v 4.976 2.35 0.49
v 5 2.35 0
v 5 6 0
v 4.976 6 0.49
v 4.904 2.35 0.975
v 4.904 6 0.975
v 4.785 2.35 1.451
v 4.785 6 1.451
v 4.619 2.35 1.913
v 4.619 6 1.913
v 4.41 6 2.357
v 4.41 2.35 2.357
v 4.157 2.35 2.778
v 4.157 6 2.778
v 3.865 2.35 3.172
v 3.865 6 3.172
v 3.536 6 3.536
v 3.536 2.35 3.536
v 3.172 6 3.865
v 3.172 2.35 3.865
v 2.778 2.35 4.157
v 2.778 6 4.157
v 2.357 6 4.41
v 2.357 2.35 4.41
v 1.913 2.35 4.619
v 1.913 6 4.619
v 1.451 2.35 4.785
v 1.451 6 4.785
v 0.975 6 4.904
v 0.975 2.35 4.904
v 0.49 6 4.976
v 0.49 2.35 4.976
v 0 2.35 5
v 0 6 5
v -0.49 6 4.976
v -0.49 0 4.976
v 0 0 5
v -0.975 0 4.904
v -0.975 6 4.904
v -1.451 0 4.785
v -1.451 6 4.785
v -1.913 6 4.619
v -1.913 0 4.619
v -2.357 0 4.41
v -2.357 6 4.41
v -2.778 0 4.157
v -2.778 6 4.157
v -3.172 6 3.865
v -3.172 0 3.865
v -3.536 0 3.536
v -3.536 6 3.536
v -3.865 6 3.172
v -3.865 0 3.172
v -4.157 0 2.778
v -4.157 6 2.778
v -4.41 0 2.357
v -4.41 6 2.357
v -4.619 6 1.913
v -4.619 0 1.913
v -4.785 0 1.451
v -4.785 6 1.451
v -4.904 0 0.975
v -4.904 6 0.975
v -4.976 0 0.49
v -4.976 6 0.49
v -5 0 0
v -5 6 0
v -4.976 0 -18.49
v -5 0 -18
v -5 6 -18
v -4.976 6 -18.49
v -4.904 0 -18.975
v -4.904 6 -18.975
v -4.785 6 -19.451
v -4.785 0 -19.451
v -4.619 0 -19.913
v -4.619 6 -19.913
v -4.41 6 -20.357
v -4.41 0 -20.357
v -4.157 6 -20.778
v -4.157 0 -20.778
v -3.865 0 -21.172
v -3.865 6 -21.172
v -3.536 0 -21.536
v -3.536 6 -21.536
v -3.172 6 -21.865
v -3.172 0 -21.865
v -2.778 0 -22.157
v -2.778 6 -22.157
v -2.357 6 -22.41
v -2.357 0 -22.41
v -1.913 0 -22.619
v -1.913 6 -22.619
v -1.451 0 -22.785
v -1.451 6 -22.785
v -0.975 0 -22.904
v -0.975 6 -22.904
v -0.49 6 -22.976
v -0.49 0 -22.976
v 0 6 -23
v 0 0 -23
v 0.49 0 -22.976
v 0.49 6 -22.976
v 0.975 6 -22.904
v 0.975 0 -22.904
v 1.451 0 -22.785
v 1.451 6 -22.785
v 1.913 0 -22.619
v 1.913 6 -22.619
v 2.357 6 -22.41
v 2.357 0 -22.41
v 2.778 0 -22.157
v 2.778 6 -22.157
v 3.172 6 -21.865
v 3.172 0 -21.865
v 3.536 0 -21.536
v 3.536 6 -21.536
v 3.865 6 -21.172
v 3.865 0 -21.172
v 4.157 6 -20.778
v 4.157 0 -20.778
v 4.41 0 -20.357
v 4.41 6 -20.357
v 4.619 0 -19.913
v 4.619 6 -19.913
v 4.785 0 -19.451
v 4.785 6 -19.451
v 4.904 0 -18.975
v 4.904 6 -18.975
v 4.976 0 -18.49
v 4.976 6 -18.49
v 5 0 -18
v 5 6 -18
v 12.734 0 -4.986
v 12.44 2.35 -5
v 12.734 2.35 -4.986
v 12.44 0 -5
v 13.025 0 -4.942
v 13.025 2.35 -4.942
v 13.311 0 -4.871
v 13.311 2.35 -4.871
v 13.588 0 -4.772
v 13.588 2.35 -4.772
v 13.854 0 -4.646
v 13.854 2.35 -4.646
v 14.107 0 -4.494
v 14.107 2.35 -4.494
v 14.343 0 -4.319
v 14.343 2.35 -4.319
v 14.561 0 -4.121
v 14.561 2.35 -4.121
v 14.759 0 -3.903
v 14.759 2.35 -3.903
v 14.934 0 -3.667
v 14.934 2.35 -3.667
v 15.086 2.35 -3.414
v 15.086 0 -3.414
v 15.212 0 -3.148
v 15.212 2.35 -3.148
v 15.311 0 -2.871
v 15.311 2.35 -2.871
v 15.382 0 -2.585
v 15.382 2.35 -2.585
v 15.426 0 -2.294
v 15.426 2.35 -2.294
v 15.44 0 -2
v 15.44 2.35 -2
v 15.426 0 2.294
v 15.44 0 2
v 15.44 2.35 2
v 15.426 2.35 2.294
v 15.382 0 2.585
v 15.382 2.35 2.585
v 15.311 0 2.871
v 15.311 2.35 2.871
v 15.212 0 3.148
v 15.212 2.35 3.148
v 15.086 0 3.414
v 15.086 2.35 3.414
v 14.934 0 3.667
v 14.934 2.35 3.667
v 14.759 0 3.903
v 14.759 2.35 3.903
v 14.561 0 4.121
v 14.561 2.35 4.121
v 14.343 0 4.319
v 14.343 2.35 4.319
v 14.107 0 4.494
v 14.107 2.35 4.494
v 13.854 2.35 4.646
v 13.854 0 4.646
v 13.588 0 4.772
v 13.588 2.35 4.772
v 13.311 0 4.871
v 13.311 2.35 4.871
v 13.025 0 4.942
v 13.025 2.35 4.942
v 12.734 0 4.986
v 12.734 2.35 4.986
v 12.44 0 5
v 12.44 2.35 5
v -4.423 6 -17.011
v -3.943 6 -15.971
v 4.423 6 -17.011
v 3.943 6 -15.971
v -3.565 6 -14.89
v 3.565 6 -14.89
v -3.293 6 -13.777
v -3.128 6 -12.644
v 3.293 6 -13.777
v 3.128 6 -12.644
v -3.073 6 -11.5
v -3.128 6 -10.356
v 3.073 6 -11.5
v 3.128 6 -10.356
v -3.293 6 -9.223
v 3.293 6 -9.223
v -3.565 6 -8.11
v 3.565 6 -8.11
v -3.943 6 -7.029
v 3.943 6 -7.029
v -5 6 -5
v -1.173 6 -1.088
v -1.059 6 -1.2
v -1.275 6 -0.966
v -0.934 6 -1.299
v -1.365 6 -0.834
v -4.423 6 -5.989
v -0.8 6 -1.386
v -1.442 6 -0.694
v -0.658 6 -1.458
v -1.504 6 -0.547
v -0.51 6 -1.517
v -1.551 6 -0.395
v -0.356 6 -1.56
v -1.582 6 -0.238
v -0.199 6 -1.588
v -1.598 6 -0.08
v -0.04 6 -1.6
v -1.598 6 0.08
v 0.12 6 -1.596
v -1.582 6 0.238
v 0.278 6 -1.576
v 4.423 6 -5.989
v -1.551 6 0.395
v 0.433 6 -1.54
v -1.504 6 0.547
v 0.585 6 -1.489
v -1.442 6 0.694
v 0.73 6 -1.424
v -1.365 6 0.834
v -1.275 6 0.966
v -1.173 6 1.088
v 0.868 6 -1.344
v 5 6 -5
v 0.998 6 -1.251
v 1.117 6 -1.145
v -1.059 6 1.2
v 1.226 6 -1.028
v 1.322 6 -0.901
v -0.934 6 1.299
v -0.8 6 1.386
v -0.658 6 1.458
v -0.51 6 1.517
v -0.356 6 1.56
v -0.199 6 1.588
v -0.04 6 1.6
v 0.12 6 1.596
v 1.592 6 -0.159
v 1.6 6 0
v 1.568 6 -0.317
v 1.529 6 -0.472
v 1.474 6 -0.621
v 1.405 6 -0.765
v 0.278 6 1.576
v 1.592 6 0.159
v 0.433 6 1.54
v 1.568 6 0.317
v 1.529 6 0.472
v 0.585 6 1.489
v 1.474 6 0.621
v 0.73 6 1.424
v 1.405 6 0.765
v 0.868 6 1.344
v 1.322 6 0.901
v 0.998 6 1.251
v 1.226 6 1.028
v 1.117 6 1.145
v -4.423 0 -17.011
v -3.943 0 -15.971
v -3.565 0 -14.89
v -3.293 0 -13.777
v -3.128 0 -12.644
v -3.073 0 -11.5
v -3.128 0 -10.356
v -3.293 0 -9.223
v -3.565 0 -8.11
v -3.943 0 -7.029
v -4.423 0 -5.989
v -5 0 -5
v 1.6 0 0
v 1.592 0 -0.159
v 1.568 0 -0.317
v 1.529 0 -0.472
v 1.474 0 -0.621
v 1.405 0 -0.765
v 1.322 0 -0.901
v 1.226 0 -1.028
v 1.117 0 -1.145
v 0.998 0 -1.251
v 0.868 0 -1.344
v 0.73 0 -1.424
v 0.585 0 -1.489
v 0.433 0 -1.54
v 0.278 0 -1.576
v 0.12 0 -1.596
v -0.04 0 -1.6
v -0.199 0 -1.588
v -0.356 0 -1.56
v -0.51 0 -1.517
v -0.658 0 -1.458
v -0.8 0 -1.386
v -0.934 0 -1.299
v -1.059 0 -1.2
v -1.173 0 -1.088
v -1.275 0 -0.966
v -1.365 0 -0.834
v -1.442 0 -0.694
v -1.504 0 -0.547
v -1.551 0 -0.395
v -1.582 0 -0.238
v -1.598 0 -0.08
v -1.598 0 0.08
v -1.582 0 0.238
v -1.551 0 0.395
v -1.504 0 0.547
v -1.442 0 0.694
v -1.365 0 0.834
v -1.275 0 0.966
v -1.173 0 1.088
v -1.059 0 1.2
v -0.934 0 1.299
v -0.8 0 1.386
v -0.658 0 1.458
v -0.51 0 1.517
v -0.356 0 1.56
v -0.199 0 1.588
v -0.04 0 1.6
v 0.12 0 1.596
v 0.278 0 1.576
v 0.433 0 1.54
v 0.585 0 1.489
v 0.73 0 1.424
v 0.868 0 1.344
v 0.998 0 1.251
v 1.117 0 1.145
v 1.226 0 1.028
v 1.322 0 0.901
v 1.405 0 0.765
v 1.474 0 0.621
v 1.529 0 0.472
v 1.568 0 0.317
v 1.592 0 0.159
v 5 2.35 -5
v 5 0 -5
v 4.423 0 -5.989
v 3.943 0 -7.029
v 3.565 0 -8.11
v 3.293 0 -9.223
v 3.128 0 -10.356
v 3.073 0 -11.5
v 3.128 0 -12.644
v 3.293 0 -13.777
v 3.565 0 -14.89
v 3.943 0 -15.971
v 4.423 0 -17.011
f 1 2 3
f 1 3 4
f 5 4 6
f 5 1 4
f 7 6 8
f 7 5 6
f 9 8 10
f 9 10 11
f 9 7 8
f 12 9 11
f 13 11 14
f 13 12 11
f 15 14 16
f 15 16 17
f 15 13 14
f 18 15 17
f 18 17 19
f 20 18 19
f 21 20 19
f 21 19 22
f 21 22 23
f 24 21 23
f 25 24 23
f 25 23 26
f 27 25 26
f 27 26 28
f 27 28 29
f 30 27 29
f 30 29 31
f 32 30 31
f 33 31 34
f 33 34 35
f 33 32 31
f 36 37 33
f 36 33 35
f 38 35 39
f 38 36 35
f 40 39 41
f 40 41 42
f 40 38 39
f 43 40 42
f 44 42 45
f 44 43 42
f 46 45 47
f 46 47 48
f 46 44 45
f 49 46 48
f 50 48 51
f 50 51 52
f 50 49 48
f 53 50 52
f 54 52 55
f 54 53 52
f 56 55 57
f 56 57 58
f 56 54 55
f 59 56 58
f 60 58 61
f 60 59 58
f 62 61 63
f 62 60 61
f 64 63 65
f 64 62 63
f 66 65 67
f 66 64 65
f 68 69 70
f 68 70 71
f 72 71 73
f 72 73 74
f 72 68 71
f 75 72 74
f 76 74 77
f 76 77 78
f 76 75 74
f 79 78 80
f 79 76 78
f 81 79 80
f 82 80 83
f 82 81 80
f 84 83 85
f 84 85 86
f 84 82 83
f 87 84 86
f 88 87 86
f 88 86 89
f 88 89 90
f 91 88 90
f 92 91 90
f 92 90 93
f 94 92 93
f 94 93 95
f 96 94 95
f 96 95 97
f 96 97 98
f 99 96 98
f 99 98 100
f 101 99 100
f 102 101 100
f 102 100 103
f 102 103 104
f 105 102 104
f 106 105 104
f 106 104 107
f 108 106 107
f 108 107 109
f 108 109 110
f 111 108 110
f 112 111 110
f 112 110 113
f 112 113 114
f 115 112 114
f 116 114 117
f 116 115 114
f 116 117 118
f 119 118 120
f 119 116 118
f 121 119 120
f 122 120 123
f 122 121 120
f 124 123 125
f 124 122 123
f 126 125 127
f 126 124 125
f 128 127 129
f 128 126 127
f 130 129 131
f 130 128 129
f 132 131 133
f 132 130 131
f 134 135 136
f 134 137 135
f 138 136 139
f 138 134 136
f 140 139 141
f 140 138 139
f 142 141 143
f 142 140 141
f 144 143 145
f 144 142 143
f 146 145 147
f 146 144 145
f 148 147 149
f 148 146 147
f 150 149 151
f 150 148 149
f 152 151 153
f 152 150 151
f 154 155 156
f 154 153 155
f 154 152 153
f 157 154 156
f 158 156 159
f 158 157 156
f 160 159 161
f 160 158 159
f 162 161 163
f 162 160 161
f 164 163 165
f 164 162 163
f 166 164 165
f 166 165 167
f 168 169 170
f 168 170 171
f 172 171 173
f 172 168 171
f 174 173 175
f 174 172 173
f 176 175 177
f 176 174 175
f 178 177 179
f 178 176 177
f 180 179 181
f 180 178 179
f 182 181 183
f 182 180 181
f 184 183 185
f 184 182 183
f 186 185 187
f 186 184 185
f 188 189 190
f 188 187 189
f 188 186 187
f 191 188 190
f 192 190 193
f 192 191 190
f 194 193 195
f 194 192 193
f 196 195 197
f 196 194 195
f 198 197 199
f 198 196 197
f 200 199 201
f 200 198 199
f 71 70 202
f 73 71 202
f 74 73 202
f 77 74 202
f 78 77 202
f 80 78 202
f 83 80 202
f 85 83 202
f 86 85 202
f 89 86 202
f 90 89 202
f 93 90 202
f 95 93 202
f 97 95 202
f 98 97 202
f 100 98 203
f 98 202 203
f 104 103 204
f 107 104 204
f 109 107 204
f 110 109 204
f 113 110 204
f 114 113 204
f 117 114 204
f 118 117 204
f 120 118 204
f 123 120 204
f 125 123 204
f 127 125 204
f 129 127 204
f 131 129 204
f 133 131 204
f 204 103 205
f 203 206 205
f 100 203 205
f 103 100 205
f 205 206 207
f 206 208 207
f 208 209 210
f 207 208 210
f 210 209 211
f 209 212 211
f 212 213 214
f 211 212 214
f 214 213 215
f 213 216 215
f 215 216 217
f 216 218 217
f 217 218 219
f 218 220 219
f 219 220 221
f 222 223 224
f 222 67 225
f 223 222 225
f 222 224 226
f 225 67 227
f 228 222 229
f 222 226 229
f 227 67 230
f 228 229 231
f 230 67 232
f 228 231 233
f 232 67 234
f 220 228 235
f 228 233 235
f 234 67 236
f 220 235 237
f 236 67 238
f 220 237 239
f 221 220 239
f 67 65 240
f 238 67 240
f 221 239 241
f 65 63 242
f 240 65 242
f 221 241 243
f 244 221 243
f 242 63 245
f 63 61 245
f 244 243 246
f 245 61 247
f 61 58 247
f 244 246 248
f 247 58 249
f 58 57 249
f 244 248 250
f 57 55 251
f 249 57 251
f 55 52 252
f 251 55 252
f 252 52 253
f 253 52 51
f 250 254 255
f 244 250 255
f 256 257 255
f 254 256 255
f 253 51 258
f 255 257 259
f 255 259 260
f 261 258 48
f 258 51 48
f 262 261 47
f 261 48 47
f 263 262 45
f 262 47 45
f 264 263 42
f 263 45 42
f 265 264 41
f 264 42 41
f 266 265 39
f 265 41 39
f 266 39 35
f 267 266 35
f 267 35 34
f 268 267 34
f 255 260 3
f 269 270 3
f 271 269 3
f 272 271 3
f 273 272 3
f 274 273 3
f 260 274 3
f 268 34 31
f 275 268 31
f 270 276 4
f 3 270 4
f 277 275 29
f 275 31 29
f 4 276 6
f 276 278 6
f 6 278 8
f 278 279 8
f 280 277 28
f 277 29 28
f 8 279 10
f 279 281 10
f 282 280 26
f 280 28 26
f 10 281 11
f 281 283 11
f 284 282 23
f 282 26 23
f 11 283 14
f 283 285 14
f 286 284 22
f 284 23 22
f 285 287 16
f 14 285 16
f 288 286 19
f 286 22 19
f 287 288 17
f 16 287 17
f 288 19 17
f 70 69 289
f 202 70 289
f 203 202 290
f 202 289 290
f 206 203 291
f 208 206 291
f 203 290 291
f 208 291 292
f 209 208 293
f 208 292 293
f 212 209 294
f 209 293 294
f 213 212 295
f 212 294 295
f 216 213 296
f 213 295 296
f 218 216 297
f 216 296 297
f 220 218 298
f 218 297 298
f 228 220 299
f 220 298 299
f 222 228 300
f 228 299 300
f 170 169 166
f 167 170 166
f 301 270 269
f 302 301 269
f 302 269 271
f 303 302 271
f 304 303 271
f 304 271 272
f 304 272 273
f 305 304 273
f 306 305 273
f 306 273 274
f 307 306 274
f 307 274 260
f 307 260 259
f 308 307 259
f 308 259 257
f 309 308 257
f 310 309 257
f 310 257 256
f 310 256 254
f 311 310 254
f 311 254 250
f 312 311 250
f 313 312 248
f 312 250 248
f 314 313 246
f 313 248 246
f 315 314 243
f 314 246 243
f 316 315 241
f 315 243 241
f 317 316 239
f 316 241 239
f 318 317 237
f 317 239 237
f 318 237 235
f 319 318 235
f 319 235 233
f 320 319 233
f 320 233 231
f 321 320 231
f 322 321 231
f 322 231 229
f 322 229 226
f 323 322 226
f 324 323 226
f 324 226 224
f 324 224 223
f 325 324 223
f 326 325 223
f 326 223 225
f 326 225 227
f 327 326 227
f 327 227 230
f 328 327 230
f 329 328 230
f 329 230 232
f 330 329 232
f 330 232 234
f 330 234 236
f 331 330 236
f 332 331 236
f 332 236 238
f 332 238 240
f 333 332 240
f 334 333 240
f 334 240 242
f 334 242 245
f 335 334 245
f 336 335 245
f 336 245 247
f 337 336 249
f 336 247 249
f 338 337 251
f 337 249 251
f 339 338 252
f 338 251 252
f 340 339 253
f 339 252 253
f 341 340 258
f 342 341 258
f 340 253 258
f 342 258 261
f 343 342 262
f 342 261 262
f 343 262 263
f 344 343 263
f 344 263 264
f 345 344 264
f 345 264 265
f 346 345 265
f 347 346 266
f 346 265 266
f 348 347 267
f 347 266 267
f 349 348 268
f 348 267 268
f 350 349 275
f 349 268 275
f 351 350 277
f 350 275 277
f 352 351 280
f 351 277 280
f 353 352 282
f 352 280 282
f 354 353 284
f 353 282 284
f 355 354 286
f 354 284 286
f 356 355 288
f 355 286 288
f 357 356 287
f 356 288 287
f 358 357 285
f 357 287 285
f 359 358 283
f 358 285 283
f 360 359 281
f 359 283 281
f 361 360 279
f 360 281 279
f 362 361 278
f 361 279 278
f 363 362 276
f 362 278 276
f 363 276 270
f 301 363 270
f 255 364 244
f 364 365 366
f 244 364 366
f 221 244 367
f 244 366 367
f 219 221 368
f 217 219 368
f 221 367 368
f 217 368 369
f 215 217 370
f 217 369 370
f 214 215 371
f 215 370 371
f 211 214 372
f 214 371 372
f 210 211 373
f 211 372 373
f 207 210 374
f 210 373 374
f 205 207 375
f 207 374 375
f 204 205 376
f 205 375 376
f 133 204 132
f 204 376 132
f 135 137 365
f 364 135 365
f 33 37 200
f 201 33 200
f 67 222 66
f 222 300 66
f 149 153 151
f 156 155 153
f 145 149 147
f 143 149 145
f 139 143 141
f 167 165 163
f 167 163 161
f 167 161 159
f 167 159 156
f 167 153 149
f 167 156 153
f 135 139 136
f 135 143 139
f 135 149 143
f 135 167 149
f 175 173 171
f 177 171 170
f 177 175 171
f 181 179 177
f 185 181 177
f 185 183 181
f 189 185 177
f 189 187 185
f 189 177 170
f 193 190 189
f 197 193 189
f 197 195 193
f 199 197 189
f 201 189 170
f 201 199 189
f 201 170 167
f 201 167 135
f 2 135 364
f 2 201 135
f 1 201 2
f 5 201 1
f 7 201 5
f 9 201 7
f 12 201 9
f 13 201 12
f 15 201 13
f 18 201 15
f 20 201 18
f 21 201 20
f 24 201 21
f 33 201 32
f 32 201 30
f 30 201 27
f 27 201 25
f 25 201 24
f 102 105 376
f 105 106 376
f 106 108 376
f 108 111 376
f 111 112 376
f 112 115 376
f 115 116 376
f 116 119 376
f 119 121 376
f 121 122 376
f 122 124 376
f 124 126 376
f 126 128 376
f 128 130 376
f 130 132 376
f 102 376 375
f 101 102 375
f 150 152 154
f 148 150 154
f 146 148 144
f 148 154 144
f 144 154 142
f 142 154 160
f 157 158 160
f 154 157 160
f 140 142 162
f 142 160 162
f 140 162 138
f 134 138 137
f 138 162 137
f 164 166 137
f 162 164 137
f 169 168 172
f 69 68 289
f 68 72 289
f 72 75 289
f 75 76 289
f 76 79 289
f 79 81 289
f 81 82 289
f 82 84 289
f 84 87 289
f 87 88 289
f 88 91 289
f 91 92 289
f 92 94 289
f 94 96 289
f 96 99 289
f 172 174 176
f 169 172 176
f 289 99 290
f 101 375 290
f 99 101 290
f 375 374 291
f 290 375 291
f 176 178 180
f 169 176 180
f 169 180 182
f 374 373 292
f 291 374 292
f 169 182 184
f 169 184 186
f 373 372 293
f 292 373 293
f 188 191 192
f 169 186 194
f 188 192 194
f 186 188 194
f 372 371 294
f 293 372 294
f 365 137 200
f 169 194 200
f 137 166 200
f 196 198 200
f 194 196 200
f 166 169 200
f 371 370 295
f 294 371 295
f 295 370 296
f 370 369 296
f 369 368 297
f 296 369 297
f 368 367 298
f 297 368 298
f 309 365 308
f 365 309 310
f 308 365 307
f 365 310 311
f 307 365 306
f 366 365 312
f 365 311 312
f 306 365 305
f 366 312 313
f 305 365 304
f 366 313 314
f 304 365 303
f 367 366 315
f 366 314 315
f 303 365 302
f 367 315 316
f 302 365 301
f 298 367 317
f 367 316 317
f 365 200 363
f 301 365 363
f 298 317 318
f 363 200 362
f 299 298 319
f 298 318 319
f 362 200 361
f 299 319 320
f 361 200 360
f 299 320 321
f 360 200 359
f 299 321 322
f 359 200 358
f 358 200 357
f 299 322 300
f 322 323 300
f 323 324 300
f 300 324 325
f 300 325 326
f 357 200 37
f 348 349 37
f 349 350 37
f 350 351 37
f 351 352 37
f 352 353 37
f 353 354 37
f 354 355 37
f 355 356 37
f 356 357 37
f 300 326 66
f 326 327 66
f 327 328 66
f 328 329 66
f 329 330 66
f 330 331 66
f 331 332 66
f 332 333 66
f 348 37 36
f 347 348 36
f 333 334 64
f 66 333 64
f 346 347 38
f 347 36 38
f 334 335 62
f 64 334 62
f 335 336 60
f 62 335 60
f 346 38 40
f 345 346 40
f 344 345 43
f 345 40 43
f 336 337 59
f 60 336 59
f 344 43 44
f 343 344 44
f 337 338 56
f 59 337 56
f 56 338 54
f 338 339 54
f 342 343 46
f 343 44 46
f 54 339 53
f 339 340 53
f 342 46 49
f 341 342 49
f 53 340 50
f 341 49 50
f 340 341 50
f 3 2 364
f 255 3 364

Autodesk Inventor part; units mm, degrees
ref_plane "YZ Plane" through (0, 0, 0) normal (1, 0, 0) x (0, 1, 0)
ref_plane "XZ Plane" through (0, 0, 0) normal (0, 1, 0) x (-1, 0, 0)
ref_plane "XY Plane" through (0, 0, 0) normal (0, 0, 1) x (1, 0, 0)
sketch "Sketch1" plane through (0, 0, 0) normal (0, 1, 0) x (-1, 0, 0)
  line L0 (0, 5) -> (-12.44, 5)
  line L1 (-15.44, 2) -> (-15.44, -2)
  line L2 (-12.44, -5) -> (5, -5)
  line L3 (5, -5) -> (5, 0)
  arc A0 (-12.44, 5) -> (-15.44, 2) centre (-12.44, 2) ccw
  arc A1 (-15.44, -2) -> (-12.44, -5) centre (-12.44, -2) ccw
  arc A2 (5, 0) -> (0, 5) centre (0, 0) ccw
  point P0 (-15.44, -5)
  point P1 (-15.44, 5)
  dimension "d0" = 20.44
  dimension "d1" = 10
  dimension "d2" = 3
  dimension "d3" = 5
extrude "Extrusion1" add sketch "Sketch1" along normal blind 2.35
sketch "Sketch3" plane through (0, 0, 0) normal (0, -1, 0) x (1, 0, 0)
  arc A0 (5, 0) -> (-5, 0) centre (0, 0) ccw
  arc A1 (-5, -18) -> (5, -18) centre (0, -18) ccw
  line L0 (-5, 0) -> (-5, -5)
  line L1 (5, 0) -> (5, -5)
  arc A2 (-5, -18) -> (-5, -5) centre (-15, -11.5) ccw
  arc A3 (5, -5) -> (5, -18) centre (15, -11.5) ccw
  dimension "d6" = 5
  dimension "d7" = 18
  dimension "d8" = 5
  dimension "d9" = 5
  dimension "d11" = 15
  dimension "d12" = 15
extrude "Extrusion2" add sketch "Sketch3" against normal blind 6
sketch "Sketch4" plane through (0, 6, 0) normal (0, 1, 0) x (1, 0, 0)
  circle A0 centre (0, 0) radius 1.6
  dimension "d16" = 3.2
extrude "Extrusion3" cut sketch "Sketch4" against normal up to next
properties part number "glass clip" material "ABS Plastic"
